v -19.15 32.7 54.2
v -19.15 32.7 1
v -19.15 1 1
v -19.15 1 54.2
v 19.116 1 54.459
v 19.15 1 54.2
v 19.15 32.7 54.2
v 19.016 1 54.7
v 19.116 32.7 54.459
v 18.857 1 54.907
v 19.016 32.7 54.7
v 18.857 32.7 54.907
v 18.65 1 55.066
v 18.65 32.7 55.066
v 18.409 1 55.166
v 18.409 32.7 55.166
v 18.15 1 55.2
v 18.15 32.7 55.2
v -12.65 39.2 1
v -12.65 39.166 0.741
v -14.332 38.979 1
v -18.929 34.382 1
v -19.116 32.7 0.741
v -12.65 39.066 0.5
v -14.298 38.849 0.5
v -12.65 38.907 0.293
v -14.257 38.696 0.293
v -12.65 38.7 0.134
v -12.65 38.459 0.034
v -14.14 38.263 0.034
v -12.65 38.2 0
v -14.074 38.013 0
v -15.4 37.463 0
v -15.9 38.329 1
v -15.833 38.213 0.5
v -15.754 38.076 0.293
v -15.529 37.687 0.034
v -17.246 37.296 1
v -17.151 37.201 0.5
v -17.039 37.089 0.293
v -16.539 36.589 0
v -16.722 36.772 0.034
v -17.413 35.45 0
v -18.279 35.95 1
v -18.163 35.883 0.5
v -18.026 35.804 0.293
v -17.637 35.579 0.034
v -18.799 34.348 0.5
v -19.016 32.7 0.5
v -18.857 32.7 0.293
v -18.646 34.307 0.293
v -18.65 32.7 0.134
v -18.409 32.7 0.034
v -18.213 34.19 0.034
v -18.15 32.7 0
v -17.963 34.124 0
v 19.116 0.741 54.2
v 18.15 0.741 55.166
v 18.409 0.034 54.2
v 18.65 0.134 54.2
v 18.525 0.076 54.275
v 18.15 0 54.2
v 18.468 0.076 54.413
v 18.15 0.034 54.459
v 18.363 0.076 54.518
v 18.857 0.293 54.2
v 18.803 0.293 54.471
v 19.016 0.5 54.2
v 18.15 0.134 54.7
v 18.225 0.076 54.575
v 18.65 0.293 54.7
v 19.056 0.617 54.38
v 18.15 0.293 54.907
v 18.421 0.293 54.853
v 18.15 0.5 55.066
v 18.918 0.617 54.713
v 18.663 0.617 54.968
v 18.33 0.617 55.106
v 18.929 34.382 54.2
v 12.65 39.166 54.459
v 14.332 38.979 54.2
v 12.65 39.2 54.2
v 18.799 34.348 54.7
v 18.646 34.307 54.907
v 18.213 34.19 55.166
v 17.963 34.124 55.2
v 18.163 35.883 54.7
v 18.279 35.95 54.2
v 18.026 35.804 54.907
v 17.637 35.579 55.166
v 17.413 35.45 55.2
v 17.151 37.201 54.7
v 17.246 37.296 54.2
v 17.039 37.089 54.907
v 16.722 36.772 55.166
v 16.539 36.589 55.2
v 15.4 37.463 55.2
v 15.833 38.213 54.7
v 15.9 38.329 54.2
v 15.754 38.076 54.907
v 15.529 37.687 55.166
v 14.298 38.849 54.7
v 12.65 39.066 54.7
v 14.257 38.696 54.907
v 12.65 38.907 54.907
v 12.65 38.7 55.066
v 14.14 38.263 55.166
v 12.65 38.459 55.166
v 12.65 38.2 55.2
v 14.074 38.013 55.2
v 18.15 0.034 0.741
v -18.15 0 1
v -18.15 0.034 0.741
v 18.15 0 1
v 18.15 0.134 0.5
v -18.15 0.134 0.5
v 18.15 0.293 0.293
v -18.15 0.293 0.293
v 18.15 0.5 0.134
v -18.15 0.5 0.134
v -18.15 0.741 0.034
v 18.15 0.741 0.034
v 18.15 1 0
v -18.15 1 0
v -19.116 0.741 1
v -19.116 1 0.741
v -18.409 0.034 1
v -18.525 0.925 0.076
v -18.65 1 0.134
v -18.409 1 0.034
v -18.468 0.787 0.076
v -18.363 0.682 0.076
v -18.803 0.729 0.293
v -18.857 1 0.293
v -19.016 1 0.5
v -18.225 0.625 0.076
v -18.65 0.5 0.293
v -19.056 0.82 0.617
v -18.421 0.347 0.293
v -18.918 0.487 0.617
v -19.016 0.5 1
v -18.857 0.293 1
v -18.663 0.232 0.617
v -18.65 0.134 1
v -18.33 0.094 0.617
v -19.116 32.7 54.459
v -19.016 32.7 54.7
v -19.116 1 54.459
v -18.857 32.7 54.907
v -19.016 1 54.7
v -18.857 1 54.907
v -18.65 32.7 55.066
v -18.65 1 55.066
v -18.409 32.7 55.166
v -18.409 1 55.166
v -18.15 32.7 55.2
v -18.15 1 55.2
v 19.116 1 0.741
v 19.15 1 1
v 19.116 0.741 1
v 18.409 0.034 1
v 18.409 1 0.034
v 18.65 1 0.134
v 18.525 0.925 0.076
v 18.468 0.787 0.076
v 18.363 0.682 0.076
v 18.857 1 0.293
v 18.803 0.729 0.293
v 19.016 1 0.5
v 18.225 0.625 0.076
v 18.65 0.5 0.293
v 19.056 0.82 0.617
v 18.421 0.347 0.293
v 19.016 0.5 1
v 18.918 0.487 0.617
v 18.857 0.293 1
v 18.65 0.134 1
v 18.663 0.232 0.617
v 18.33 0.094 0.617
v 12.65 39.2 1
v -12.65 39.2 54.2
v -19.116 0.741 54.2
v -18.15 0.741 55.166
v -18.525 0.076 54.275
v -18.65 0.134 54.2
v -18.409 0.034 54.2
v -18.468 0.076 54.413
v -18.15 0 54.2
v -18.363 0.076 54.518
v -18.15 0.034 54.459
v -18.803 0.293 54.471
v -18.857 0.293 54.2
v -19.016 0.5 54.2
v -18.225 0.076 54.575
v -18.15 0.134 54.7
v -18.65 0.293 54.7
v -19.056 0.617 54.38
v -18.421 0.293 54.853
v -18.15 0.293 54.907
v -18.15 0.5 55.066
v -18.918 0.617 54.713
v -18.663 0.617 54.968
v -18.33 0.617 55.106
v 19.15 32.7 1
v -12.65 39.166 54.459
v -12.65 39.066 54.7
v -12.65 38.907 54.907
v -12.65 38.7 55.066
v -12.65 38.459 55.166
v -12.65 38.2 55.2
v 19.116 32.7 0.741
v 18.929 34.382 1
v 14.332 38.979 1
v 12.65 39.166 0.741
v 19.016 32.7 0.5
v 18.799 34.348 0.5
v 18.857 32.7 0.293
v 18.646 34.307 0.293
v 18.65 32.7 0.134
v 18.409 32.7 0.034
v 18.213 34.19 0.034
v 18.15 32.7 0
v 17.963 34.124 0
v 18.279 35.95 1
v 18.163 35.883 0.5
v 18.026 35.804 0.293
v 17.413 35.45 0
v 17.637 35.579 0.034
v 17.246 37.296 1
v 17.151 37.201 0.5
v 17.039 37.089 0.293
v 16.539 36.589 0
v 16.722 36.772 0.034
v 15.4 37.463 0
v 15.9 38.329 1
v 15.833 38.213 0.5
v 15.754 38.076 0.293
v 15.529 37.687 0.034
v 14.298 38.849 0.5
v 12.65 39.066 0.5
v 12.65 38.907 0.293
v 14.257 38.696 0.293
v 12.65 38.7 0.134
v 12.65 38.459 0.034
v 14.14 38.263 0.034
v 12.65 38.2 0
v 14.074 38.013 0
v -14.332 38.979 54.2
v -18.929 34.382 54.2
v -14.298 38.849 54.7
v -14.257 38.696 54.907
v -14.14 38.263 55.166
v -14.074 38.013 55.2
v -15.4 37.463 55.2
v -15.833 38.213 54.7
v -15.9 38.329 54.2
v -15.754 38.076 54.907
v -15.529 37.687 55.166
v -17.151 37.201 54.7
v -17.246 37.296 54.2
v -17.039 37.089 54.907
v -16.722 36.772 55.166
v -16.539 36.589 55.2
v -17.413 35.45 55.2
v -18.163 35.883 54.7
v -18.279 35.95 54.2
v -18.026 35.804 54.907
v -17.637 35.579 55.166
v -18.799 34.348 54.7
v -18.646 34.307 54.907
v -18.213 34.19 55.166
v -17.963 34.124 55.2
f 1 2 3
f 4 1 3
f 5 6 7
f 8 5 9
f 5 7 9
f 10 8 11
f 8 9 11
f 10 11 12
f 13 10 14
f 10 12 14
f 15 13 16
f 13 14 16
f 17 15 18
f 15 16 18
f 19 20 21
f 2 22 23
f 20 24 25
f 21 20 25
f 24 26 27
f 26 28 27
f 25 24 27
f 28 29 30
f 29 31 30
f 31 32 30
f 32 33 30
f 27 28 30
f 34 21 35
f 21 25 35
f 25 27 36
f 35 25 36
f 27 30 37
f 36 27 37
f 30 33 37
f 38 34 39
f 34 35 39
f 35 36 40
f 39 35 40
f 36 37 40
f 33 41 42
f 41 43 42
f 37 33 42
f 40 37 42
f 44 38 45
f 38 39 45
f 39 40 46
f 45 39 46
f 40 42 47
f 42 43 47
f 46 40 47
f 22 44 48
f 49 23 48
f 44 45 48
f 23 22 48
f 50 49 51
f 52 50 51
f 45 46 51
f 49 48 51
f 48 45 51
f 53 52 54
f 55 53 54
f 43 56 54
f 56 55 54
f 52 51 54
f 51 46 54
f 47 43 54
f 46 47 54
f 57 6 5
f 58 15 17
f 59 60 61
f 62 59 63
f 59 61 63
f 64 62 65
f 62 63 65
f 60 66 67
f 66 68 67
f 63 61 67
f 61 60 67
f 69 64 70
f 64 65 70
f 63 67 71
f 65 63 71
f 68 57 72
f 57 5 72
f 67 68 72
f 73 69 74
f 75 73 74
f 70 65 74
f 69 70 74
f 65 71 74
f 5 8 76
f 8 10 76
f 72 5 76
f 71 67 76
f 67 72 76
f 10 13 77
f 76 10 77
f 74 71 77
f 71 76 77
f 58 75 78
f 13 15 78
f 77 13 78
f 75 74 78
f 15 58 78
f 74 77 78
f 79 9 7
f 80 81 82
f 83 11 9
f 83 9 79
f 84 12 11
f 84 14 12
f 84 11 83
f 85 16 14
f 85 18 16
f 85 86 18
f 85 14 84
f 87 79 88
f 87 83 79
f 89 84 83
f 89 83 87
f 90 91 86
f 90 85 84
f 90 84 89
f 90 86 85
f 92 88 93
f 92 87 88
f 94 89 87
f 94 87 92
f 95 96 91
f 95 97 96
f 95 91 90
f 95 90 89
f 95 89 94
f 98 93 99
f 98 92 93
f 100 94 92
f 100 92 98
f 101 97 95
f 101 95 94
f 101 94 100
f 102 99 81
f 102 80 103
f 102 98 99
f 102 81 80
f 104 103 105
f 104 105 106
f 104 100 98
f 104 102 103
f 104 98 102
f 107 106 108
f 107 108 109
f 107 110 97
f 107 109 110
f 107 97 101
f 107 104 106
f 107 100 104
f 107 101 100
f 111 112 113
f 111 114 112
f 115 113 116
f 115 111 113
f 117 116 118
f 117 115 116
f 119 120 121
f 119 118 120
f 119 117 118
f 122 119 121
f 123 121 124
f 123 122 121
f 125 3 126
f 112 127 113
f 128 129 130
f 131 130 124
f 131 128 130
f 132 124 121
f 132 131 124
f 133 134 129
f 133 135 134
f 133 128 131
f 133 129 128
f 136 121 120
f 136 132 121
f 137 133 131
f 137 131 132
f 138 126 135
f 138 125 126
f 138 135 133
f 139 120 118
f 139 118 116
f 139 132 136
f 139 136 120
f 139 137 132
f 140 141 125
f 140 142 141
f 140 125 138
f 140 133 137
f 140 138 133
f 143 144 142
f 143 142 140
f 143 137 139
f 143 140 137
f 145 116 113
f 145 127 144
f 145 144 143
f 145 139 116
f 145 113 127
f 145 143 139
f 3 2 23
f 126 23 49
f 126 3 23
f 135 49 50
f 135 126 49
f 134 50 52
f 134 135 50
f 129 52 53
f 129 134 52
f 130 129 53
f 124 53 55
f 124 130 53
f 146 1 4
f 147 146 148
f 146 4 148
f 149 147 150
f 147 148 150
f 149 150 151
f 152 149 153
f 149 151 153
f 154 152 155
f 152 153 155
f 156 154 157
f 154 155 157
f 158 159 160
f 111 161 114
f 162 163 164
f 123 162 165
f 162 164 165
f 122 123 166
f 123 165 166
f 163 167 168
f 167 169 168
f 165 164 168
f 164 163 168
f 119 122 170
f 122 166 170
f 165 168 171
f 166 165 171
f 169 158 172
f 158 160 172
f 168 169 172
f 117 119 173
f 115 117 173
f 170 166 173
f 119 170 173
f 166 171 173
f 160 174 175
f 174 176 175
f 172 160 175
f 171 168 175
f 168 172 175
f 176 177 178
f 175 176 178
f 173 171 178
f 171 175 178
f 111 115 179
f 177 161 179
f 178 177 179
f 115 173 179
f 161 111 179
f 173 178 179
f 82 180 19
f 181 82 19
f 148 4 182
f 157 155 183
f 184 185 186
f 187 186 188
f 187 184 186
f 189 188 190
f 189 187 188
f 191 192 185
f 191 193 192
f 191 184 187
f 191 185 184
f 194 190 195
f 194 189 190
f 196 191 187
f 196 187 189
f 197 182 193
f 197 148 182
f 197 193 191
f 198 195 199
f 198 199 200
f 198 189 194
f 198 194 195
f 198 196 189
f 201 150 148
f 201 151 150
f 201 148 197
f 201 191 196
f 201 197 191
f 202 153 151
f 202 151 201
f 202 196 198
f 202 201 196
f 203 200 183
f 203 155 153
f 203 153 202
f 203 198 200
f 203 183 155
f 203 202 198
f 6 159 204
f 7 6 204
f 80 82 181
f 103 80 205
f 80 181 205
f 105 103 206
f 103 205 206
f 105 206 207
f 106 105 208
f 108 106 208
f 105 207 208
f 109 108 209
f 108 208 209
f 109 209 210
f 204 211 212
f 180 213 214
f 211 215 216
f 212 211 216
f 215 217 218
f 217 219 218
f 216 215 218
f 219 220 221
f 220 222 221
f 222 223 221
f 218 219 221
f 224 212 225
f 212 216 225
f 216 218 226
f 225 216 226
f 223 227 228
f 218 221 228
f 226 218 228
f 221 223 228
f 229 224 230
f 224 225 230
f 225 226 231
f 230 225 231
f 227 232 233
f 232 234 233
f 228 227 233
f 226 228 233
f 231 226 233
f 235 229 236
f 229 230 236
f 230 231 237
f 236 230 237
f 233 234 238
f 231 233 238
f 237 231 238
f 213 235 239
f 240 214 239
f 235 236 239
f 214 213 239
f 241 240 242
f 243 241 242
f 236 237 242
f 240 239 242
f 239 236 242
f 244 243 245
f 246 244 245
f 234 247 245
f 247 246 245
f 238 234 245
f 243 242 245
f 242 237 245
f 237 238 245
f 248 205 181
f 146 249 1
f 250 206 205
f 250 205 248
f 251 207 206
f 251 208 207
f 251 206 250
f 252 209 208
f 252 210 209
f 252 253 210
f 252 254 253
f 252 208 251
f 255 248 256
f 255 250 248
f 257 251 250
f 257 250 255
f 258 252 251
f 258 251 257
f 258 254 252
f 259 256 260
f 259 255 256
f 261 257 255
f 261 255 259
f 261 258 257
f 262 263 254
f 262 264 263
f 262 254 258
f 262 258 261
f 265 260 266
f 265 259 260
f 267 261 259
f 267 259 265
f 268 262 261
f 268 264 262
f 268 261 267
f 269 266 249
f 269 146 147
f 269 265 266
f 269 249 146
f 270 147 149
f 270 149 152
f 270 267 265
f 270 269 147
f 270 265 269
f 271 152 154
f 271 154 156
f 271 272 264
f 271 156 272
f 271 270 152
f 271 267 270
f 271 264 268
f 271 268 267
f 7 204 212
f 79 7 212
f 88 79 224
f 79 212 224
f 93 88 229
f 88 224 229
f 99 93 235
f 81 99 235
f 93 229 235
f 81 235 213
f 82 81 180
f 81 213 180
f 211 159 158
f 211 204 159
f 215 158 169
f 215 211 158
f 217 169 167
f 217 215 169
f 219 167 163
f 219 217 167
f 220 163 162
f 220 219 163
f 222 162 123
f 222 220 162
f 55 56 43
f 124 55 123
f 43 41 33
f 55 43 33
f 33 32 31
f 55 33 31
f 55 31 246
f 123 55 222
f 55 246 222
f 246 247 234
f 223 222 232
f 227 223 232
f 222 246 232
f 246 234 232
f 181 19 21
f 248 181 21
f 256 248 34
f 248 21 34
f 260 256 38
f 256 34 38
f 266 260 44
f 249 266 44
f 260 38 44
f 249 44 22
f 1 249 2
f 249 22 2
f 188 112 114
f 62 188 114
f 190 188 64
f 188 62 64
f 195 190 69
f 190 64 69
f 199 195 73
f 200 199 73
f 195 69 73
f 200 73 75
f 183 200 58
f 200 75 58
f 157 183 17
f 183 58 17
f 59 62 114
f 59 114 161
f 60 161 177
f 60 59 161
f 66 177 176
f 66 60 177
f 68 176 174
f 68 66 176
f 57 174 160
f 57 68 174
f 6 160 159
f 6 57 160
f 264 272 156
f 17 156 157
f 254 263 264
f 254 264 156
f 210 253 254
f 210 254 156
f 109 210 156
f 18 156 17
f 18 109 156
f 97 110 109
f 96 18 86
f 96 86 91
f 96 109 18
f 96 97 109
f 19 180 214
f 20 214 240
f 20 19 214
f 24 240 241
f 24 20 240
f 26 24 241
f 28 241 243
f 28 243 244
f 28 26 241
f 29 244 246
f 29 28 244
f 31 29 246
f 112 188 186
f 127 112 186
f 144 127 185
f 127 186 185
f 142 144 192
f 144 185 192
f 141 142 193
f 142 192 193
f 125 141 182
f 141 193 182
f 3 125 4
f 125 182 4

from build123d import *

# Parameters (mm, degrees)
EXTRUDE1_DEPTH = 55.2
FILLET1_R      = 1


with BuildPart() as part:
    # Sketch1 → Extrude1 (new body)
    with BuildSketch(Plane.XY):
        with BuildLine():
            Line((-19.15, 0), (19.15, 0))
            Line((19.15, 0), (19.15, 32.7))
            ThreePointArc((19.15, 32.7), (17.246194078, 37.296194078), (12.65, 39.2))
            Line((12.65, 39.2), (-12.65, 39.2))
            ThreePointArc((-12.65, 39.2), (-17.246194078, 37.296194078), (-19.15, 32.7))
            Line((-19.15, 32.7), (-19.15, 0))
        make_face()
    extrude(amount=EXTRUDE1_DEPTH)

    # Fillet1
    fillet1_edges = [part.edges().sort_by_distance(p)[0] for p in [
        (19.15, 16.35, 55.2),
        (19.15, 0, 27.6),
        (-19.15, 0, 27.6),
        (17.246194078, 37.296194078, 55.2),
        (0, 39.2, 55.2),
        (-17.246194078, 37.296194078, 55.2),
        (-19.15, 16.35, 55.2),
        (-17.246194078, 37.296194078, 0),
        (0, 39.2, 0),
        (17.246194078, 37.296194078, 0),
        (19.15, 16.35, 0),
        (0, 0, 55.2),
        (0, 0, 0),
        (-19.15, 16.35, 0),
    ]]
    fillet(fillet1_edges, radius=FILLET1_R)


solid = part.part
